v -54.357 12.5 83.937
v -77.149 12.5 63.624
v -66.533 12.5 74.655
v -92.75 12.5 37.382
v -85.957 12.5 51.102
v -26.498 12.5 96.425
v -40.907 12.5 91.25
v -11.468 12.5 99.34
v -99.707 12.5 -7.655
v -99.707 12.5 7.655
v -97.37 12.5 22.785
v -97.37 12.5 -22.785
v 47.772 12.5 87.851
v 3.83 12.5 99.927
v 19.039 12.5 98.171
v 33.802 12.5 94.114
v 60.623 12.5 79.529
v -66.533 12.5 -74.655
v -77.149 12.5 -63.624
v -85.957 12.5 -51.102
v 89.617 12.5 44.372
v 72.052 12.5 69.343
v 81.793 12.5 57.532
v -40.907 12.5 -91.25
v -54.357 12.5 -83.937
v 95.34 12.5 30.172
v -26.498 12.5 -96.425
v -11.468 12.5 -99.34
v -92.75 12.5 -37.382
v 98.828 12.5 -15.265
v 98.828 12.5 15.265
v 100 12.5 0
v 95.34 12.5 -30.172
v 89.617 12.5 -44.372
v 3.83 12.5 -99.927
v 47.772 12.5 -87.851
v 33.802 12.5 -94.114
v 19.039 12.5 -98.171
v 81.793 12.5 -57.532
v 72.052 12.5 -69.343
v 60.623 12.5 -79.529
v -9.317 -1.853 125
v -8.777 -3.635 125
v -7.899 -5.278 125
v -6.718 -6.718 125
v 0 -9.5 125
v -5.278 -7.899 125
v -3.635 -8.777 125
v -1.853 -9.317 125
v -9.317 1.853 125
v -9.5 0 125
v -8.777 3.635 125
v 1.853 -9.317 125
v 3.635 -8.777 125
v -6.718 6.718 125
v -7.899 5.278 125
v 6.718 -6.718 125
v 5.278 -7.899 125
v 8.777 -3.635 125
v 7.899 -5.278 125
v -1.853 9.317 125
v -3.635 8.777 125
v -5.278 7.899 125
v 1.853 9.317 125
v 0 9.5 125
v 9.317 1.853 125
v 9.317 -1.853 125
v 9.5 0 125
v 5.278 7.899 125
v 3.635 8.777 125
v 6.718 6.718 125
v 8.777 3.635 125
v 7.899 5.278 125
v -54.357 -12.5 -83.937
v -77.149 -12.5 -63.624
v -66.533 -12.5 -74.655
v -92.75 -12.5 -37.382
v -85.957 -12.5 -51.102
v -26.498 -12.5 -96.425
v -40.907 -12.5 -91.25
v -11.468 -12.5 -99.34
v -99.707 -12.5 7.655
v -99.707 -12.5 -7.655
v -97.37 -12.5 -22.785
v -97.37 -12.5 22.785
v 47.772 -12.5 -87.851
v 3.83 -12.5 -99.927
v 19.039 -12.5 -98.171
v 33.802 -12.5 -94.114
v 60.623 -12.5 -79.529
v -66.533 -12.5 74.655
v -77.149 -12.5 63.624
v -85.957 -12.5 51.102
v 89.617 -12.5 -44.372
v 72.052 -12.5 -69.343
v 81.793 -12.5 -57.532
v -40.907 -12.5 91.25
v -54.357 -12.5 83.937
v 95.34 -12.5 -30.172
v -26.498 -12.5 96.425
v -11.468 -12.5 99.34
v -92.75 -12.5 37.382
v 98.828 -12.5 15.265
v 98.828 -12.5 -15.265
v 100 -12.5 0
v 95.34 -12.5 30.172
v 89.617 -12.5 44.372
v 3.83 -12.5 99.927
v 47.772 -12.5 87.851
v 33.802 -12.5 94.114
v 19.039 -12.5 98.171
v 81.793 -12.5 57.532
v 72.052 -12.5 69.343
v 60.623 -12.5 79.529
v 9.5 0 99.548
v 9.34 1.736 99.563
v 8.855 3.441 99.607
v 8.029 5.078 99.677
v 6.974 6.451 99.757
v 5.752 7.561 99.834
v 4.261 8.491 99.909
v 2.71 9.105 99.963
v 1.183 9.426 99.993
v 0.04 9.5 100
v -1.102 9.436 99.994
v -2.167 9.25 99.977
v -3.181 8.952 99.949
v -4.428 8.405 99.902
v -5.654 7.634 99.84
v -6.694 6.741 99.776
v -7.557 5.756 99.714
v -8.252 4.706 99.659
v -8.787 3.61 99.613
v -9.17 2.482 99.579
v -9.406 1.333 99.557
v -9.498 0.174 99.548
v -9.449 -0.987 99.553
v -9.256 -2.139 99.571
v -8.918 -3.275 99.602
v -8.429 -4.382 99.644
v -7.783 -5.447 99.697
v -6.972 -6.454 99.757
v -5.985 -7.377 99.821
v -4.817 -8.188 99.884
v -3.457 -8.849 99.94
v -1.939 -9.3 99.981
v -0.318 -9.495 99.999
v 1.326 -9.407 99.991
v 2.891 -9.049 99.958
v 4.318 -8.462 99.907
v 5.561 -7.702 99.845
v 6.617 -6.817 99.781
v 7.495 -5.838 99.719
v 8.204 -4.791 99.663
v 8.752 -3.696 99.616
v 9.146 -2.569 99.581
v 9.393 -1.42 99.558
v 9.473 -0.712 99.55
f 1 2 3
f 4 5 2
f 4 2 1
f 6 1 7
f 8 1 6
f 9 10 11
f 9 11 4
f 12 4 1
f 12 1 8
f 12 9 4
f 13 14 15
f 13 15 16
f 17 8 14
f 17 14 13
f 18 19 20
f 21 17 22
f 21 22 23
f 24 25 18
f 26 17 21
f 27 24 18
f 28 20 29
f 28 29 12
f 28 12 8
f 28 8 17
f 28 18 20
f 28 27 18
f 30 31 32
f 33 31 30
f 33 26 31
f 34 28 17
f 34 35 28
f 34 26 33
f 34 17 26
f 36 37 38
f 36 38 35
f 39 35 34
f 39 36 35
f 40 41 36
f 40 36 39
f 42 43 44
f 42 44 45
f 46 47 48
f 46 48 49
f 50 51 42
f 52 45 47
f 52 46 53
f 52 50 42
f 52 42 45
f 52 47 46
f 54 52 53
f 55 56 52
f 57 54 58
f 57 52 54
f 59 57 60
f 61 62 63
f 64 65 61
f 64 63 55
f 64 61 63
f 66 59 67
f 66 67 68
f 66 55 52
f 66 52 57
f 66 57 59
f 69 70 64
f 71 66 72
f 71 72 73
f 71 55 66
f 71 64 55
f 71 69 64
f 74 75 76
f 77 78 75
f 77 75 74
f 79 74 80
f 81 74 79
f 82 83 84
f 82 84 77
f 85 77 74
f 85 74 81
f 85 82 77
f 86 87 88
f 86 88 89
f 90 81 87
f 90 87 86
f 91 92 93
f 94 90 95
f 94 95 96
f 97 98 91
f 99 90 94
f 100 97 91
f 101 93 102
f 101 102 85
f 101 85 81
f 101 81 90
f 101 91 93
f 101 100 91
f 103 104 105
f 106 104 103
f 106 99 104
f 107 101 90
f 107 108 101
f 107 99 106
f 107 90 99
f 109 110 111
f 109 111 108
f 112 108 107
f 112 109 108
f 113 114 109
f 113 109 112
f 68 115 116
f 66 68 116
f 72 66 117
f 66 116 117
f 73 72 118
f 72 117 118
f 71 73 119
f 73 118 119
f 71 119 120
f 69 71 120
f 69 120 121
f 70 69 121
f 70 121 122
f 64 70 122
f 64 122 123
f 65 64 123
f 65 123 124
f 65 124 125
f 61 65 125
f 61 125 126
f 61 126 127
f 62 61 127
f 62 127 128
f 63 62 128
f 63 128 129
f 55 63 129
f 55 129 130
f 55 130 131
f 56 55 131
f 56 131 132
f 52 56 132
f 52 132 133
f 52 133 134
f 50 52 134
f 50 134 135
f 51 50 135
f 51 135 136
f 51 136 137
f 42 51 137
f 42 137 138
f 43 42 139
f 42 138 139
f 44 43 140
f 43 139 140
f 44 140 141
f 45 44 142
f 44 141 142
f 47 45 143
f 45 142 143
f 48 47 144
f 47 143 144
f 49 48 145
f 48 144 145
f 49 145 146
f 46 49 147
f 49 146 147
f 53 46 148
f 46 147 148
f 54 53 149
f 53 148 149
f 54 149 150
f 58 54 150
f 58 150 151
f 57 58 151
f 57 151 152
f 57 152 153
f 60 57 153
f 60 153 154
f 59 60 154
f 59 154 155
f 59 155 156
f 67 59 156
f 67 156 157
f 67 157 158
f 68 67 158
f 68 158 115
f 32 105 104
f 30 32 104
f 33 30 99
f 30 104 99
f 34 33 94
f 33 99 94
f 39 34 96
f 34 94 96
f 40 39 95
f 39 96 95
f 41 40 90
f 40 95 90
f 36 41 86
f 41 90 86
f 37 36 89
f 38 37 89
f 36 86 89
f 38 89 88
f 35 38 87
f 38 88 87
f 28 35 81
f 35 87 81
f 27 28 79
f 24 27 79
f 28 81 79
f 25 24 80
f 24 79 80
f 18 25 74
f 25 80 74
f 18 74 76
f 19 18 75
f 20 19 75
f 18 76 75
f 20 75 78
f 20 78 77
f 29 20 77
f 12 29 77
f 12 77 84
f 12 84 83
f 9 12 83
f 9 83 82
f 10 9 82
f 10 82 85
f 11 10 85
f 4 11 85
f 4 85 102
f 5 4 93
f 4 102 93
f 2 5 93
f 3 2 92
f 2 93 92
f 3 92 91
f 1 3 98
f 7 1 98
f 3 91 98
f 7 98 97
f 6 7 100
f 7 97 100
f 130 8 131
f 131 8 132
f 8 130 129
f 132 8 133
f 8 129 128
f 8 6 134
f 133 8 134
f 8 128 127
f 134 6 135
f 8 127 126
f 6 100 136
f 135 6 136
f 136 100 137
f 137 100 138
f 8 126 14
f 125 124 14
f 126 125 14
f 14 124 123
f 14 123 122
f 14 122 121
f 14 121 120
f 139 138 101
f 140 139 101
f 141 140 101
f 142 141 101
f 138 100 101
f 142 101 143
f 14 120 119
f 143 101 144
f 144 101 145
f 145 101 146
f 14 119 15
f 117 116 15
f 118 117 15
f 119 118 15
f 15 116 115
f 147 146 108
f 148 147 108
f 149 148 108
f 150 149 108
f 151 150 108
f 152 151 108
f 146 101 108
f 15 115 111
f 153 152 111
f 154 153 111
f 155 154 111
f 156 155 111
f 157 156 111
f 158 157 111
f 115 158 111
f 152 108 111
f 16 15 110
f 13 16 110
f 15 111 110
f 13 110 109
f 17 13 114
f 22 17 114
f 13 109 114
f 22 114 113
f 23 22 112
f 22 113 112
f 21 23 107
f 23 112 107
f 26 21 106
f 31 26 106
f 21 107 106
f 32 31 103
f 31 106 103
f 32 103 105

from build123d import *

# Parameters (mm, degrees)
F0_R      = 100
F1_DEPTH  = 12.5
F1_FACE_R = 100
F2_DEPTH  = 12.5
F3_R      = 9.5
F4_DEPTH  = 125


with BuildPart() as f1:
    # F0 (on Front) → F1 (new body)
    with BuildSketch(Plane.XZ):
        Circle(F0_R)
    extrude(amount=F1_DEPTH)

    # F1_face (on face) → F2 (join)
    with BuildSketch(Plane(origin=(0, 0, 0), x_dir=(1, 0, 0), z_dir=(0, 1, 0))):
        Circle(F1_FACE_R)
    extrude(amount=F2_DEPTH)

    # F3 (on Top) → F4 (join)
    with BuildSketch(Plane.XY):
        Circle(F3_R)
    extrude(amount=F4_DEPTH)


solid = f1.part
